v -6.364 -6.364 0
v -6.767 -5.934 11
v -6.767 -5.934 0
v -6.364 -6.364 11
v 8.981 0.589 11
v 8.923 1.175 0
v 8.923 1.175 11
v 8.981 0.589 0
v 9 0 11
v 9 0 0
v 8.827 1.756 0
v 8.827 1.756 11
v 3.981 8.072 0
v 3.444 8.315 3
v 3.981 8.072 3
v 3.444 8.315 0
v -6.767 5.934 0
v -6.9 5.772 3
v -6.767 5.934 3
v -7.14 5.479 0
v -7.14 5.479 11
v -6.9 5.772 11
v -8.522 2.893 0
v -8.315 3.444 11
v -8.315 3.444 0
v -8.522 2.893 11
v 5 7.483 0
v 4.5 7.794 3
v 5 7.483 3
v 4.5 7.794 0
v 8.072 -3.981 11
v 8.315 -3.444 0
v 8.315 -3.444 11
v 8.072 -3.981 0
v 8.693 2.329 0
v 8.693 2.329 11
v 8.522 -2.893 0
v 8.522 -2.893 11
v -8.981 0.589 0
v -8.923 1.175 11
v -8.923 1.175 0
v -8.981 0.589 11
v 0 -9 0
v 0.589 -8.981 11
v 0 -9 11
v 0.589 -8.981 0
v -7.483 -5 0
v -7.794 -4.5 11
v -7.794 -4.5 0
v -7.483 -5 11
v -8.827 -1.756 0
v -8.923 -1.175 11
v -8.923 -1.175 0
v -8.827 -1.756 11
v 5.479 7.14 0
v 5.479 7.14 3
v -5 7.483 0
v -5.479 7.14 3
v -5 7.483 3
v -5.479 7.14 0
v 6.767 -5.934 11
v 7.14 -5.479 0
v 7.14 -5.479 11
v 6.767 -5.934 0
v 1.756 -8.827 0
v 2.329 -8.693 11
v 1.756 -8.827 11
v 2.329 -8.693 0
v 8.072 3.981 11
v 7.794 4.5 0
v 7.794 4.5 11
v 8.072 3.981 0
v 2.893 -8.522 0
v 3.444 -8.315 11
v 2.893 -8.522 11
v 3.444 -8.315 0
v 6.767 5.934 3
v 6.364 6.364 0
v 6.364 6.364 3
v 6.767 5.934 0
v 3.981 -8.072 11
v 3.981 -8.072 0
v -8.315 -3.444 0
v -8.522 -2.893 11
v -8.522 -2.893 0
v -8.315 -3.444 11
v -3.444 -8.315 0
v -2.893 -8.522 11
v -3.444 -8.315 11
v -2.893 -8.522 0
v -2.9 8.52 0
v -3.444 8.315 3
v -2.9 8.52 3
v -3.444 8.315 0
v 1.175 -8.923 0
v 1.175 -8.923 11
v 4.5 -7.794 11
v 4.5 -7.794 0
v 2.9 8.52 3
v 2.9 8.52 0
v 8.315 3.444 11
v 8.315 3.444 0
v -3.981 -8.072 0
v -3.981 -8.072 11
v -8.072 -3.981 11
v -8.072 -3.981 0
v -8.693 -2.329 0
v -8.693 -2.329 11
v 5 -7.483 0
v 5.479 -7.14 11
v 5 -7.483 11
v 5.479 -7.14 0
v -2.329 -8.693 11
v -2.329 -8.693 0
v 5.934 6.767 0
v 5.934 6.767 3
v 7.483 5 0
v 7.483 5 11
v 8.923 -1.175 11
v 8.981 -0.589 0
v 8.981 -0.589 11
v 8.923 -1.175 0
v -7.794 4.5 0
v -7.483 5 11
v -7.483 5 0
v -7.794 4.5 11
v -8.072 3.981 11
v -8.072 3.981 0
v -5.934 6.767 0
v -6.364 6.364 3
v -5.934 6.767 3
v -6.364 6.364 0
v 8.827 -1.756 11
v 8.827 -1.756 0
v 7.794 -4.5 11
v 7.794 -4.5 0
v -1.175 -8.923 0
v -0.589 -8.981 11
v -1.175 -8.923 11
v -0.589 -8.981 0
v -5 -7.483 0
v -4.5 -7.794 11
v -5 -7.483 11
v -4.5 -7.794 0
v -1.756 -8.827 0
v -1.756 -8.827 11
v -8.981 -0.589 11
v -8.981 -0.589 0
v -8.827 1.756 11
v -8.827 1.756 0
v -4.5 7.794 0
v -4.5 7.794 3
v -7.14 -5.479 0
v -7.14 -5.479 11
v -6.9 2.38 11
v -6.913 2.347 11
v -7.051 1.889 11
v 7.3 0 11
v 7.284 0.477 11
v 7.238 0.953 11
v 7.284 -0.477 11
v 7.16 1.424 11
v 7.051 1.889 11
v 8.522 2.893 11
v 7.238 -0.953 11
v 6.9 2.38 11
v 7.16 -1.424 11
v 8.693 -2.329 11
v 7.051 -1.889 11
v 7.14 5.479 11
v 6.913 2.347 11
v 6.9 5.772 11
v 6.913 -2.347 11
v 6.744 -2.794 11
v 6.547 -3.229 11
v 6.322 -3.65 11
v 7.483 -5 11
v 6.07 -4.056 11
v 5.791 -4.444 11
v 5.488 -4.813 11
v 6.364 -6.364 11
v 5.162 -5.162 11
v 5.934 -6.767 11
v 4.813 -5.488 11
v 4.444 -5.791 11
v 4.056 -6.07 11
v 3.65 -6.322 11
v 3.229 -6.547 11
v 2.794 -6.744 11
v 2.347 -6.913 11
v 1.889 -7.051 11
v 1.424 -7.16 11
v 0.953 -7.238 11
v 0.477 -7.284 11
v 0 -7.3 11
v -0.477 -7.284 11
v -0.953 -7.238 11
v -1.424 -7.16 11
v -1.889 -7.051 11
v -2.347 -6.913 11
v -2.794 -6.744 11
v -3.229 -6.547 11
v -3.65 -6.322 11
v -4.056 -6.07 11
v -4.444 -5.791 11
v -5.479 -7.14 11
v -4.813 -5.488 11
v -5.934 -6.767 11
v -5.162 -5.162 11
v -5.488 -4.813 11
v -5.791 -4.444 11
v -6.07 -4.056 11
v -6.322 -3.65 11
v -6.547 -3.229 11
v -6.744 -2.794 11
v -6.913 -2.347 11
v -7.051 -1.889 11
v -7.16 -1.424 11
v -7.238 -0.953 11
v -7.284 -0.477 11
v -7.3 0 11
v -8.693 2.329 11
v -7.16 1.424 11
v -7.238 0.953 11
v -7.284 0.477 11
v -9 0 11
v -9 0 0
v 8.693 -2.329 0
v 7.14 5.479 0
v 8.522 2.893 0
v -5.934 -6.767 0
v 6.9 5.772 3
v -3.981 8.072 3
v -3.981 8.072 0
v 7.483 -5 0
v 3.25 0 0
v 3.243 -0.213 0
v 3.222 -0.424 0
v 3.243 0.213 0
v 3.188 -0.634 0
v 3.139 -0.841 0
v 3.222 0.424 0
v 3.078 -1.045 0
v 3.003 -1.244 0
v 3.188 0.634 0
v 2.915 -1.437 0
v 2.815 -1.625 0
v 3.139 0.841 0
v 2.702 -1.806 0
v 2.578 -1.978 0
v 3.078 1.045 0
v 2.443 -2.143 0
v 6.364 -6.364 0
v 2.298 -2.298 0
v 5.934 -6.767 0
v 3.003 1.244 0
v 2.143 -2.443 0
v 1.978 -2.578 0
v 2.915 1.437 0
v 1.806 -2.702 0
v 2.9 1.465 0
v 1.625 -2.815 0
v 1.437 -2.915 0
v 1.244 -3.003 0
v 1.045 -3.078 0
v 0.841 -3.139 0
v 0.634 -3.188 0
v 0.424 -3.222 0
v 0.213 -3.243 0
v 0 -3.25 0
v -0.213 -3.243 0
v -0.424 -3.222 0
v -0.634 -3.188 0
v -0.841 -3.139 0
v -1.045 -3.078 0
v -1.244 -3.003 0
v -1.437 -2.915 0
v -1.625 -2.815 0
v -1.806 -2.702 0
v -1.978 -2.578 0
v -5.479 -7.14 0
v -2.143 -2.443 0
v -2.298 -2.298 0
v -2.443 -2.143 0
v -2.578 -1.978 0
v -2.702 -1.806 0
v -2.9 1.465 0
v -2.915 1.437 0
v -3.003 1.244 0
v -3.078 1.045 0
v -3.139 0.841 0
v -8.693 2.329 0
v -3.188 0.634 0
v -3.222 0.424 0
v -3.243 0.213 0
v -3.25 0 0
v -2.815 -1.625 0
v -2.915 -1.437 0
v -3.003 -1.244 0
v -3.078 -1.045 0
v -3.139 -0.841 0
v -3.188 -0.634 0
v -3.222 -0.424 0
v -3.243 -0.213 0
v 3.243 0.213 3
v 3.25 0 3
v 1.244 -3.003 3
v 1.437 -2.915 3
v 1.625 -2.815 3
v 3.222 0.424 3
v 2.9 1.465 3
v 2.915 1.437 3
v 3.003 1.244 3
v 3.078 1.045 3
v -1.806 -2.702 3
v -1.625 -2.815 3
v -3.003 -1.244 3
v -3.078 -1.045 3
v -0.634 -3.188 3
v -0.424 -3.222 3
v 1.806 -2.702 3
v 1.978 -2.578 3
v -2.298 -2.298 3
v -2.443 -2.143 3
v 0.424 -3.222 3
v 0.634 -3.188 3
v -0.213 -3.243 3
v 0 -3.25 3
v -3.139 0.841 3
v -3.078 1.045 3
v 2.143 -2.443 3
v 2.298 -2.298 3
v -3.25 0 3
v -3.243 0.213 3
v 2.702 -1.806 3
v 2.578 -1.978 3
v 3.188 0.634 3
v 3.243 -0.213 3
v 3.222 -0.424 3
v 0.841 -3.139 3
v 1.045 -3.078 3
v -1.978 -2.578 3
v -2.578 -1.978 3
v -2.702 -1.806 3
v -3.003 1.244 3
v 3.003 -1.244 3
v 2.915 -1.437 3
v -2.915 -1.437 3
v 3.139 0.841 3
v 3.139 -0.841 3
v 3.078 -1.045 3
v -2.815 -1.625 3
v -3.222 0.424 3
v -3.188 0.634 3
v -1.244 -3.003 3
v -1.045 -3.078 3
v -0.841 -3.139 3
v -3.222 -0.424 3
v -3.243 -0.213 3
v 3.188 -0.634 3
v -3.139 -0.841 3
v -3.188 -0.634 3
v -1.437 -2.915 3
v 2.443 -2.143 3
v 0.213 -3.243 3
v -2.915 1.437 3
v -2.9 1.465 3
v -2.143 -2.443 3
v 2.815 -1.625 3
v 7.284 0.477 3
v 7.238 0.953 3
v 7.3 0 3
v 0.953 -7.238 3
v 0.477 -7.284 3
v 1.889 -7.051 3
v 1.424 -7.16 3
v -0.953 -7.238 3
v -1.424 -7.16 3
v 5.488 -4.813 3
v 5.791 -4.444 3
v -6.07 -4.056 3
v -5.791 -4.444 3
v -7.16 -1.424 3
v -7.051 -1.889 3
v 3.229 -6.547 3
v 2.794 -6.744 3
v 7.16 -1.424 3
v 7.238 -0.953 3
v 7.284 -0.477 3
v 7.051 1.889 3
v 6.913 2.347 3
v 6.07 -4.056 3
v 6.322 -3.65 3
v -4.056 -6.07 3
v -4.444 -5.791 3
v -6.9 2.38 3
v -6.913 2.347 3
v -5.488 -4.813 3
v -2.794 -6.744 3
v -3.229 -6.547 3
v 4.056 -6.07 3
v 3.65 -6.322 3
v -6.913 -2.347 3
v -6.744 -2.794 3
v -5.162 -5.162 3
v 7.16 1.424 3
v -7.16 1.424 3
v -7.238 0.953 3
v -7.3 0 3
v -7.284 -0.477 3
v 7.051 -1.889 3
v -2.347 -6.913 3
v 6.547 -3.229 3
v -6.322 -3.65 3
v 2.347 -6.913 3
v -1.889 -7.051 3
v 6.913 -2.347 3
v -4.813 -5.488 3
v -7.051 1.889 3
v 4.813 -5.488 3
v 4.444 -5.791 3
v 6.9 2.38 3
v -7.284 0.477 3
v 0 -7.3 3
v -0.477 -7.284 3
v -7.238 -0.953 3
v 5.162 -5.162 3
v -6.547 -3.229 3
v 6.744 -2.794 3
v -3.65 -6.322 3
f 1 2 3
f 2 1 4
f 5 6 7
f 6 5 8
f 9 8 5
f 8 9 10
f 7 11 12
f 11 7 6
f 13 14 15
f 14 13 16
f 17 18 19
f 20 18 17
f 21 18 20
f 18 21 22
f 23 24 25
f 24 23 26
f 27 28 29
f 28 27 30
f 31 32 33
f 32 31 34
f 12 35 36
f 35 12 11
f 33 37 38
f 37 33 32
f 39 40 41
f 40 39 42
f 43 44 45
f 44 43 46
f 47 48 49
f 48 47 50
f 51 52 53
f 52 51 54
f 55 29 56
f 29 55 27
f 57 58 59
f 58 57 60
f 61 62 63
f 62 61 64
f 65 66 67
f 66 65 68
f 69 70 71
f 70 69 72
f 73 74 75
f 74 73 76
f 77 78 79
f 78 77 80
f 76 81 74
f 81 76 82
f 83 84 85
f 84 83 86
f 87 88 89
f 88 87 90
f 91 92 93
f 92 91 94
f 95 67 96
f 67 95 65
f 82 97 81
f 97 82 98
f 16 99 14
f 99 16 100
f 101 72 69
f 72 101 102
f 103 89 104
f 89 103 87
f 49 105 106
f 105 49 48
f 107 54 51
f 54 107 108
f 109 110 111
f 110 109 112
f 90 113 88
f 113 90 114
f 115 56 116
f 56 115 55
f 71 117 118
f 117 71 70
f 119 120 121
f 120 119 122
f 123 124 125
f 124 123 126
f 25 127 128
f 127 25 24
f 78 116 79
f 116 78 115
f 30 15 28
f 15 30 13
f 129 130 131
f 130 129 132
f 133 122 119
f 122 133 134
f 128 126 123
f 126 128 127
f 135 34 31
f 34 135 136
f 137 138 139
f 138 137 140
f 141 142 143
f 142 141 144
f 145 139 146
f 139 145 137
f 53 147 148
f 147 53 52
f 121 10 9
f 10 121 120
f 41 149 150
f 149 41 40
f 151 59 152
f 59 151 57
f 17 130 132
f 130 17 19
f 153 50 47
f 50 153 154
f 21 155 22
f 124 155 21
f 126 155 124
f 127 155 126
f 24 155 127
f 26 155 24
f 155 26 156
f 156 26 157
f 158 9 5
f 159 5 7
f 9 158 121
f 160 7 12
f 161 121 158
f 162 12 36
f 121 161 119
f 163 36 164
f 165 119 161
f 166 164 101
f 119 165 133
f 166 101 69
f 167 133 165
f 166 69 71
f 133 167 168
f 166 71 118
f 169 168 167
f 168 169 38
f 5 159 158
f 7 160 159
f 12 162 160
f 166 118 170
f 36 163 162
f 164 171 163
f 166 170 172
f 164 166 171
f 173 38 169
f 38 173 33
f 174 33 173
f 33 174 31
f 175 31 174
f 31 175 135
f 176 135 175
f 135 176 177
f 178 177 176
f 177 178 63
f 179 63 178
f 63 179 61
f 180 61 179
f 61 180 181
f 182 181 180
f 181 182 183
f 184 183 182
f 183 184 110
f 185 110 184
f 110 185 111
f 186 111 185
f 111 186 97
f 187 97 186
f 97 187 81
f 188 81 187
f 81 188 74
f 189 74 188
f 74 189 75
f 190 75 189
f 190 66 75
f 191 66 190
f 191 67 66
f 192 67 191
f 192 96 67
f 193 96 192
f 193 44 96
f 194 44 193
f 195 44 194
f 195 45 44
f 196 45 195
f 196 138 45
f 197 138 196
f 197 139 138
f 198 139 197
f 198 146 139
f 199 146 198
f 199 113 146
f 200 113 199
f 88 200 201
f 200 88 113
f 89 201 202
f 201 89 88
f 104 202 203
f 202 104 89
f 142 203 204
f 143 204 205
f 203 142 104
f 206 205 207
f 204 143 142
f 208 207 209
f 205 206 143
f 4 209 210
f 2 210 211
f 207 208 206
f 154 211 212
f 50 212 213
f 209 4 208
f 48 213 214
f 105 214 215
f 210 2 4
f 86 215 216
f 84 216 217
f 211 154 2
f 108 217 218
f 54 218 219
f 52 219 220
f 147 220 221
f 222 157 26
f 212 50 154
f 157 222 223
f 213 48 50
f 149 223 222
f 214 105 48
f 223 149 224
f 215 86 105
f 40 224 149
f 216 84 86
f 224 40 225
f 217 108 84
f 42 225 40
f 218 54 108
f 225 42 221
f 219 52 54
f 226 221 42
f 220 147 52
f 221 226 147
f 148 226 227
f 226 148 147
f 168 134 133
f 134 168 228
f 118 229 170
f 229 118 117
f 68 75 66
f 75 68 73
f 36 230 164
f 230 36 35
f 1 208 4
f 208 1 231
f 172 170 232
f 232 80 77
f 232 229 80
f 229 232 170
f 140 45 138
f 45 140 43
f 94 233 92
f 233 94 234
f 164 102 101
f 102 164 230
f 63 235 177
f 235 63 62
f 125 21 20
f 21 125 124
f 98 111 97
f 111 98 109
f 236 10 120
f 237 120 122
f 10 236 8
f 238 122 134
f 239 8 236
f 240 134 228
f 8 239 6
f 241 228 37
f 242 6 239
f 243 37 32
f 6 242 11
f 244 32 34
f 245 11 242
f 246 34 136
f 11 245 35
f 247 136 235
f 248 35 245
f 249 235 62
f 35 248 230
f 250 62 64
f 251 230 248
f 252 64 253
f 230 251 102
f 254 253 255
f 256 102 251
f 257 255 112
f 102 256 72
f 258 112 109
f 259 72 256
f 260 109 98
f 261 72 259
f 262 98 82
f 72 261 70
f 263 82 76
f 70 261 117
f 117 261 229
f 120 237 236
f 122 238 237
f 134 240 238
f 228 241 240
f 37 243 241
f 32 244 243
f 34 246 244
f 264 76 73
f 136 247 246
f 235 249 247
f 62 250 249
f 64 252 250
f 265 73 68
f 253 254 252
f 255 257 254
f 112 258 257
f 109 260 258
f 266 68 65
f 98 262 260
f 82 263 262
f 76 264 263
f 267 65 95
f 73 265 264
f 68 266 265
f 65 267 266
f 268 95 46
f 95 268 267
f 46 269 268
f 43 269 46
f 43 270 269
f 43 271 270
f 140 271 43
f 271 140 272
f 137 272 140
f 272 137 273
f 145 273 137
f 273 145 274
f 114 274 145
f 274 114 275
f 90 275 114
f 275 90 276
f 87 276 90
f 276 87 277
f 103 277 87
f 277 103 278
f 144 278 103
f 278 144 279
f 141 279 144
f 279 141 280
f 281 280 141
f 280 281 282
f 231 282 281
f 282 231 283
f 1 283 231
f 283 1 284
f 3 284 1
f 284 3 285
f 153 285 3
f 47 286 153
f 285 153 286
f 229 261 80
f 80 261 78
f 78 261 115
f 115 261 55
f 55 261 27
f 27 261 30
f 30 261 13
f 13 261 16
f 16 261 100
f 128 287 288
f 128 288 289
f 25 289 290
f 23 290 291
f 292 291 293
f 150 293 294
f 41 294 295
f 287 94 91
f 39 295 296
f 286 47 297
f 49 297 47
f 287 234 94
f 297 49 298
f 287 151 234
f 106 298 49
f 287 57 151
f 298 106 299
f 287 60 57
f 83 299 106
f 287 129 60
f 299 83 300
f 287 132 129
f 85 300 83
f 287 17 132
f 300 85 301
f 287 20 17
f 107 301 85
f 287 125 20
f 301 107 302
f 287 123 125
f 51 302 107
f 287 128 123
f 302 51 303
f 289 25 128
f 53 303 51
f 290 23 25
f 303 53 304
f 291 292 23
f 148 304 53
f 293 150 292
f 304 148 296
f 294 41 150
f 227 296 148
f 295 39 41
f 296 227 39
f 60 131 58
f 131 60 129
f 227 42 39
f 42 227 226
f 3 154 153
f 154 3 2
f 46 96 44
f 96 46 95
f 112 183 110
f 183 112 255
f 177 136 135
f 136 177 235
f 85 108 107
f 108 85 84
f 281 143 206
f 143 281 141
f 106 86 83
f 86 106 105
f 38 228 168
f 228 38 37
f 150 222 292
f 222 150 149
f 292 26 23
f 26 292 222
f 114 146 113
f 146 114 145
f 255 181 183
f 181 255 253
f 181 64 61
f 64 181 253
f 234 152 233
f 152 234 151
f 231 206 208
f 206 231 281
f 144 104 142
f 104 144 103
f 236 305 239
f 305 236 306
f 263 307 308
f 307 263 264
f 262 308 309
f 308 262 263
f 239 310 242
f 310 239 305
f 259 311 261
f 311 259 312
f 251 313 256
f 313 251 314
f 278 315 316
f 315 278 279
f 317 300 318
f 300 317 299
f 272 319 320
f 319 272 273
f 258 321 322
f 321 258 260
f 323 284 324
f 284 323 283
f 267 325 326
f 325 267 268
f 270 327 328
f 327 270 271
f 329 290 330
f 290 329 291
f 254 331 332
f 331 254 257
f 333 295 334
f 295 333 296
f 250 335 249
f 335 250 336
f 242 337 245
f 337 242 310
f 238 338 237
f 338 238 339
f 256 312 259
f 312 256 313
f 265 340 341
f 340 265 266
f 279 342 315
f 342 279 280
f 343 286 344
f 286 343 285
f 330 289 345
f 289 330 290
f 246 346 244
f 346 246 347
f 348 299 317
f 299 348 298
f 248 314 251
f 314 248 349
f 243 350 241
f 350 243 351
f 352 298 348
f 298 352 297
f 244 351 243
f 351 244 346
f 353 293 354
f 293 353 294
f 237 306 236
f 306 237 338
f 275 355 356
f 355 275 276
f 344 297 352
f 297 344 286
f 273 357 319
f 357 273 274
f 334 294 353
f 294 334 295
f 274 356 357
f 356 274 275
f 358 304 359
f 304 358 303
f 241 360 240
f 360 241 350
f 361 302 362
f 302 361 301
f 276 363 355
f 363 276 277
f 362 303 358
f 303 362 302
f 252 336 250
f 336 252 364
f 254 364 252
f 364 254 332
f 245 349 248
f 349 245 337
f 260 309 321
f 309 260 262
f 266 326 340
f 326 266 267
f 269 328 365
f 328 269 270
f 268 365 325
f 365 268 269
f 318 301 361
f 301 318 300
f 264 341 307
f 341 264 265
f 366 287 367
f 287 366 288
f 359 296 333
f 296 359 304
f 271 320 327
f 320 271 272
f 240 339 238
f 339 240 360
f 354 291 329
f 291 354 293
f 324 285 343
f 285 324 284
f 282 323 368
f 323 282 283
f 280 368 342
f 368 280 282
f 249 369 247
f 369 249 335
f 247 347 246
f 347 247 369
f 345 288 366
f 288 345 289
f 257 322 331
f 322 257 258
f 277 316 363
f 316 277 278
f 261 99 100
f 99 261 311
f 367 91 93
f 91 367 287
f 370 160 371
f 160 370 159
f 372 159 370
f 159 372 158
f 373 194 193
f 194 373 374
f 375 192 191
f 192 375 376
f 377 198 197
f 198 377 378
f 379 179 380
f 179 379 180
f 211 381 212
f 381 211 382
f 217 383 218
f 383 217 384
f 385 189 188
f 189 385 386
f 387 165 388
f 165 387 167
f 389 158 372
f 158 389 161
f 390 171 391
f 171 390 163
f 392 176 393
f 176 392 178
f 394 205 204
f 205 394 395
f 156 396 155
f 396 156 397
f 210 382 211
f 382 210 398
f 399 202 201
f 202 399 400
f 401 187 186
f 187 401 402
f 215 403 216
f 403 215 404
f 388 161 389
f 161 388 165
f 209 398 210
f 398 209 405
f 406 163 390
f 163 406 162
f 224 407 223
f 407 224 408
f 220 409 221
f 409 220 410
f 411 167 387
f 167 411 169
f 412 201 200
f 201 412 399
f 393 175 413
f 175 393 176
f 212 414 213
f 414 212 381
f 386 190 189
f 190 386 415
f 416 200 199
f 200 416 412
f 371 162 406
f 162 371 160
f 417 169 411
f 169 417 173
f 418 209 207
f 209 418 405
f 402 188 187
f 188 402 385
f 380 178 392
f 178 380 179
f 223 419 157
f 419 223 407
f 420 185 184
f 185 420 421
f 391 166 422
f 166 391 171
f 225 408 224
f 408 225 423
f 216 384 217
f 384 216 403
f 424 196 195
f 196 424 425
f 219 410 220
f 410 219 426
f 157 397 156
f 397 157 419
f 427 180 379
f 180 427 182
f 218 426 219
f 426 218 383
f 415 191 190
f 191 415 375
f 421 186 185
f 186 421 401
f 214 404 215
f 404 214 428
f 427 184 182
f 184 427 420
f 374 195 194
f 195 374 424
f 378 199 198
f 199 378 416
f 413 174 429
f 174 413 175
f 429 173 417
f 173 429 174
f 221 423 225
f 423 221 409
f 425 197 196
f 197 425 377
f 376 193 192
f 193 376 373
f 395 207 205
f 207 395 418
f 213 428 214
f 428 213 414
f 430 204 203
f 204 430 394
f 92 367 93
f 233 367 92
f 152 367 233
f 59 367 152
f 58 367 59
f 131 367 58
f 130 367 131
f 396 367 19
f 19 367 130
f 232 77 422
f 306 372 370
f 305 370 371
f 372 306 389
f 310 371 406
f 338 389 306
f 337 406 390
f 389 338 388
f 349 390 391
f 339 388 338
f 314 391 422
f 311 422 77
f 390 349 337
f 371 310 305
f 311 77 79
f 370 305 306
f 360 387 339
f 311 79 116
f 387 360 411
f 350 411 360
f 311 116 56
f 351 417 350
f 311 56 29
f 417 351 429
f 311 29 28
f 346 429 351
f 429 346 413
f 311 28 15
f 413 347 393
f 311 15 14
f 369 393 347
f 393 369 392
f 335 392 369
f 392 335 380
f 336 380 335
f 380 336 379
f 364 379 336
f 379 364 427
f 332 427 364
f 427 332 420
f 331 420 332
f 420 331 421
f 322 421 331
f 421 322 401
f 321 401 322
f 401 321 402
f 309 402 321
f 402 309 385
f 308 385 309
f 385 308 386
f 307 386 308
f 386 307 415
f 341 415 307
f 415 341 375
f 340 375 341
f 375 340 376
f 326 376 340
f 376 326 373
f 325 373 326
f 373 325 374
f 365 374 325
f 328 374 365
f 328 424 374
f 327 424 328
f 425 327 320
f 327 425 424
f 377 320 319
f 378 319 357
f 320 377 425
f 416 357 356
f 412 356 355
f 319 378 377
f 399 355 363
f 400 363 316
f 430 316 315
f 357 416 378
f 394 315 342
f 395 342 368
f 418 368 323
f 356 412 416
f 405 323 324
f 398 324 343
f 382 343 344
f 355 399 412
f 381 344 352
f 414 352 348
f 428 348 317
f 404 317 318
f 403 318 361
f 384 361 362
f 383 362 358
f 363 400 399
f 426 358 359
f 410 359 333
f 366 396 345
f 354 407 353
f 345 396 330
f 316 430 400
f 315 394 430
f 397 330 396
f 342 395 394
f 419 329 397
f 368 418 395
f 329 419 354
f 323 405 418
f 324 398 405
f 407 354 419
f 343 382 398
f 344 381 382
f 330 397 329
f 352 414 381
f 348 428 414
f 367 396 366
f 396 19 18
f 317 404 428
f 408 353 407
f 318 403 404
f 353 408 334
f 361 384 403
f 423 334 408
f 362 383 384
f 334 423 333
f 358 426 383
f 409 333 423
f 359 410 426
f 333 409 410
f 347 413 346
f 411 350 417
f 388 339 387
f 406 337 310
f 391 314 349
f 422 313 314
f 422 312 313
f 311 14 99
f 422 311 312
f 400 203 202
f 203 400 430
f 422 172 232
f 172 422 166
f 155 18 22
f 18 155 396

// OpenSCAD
// Dimensions in mm
thickness = 11;
overlap = 8;

$fn = 96;
neck = thickness-overlap;
difference() {
    cylinder(h=thickness,r=9);
    translate([0,0,-0.1]) cylinder(h=thickness+0.2,r=3.25);
    translate([-2.9,0,-0.1]) cube([5.8,12,thickness+0.2]);
    translate([0,0,neck]) cylinder(h=overlap+0.1,r=7.3);
    translate([-6.9,0,neck]) cube([13.8,12,overlap+0.1]);
}
